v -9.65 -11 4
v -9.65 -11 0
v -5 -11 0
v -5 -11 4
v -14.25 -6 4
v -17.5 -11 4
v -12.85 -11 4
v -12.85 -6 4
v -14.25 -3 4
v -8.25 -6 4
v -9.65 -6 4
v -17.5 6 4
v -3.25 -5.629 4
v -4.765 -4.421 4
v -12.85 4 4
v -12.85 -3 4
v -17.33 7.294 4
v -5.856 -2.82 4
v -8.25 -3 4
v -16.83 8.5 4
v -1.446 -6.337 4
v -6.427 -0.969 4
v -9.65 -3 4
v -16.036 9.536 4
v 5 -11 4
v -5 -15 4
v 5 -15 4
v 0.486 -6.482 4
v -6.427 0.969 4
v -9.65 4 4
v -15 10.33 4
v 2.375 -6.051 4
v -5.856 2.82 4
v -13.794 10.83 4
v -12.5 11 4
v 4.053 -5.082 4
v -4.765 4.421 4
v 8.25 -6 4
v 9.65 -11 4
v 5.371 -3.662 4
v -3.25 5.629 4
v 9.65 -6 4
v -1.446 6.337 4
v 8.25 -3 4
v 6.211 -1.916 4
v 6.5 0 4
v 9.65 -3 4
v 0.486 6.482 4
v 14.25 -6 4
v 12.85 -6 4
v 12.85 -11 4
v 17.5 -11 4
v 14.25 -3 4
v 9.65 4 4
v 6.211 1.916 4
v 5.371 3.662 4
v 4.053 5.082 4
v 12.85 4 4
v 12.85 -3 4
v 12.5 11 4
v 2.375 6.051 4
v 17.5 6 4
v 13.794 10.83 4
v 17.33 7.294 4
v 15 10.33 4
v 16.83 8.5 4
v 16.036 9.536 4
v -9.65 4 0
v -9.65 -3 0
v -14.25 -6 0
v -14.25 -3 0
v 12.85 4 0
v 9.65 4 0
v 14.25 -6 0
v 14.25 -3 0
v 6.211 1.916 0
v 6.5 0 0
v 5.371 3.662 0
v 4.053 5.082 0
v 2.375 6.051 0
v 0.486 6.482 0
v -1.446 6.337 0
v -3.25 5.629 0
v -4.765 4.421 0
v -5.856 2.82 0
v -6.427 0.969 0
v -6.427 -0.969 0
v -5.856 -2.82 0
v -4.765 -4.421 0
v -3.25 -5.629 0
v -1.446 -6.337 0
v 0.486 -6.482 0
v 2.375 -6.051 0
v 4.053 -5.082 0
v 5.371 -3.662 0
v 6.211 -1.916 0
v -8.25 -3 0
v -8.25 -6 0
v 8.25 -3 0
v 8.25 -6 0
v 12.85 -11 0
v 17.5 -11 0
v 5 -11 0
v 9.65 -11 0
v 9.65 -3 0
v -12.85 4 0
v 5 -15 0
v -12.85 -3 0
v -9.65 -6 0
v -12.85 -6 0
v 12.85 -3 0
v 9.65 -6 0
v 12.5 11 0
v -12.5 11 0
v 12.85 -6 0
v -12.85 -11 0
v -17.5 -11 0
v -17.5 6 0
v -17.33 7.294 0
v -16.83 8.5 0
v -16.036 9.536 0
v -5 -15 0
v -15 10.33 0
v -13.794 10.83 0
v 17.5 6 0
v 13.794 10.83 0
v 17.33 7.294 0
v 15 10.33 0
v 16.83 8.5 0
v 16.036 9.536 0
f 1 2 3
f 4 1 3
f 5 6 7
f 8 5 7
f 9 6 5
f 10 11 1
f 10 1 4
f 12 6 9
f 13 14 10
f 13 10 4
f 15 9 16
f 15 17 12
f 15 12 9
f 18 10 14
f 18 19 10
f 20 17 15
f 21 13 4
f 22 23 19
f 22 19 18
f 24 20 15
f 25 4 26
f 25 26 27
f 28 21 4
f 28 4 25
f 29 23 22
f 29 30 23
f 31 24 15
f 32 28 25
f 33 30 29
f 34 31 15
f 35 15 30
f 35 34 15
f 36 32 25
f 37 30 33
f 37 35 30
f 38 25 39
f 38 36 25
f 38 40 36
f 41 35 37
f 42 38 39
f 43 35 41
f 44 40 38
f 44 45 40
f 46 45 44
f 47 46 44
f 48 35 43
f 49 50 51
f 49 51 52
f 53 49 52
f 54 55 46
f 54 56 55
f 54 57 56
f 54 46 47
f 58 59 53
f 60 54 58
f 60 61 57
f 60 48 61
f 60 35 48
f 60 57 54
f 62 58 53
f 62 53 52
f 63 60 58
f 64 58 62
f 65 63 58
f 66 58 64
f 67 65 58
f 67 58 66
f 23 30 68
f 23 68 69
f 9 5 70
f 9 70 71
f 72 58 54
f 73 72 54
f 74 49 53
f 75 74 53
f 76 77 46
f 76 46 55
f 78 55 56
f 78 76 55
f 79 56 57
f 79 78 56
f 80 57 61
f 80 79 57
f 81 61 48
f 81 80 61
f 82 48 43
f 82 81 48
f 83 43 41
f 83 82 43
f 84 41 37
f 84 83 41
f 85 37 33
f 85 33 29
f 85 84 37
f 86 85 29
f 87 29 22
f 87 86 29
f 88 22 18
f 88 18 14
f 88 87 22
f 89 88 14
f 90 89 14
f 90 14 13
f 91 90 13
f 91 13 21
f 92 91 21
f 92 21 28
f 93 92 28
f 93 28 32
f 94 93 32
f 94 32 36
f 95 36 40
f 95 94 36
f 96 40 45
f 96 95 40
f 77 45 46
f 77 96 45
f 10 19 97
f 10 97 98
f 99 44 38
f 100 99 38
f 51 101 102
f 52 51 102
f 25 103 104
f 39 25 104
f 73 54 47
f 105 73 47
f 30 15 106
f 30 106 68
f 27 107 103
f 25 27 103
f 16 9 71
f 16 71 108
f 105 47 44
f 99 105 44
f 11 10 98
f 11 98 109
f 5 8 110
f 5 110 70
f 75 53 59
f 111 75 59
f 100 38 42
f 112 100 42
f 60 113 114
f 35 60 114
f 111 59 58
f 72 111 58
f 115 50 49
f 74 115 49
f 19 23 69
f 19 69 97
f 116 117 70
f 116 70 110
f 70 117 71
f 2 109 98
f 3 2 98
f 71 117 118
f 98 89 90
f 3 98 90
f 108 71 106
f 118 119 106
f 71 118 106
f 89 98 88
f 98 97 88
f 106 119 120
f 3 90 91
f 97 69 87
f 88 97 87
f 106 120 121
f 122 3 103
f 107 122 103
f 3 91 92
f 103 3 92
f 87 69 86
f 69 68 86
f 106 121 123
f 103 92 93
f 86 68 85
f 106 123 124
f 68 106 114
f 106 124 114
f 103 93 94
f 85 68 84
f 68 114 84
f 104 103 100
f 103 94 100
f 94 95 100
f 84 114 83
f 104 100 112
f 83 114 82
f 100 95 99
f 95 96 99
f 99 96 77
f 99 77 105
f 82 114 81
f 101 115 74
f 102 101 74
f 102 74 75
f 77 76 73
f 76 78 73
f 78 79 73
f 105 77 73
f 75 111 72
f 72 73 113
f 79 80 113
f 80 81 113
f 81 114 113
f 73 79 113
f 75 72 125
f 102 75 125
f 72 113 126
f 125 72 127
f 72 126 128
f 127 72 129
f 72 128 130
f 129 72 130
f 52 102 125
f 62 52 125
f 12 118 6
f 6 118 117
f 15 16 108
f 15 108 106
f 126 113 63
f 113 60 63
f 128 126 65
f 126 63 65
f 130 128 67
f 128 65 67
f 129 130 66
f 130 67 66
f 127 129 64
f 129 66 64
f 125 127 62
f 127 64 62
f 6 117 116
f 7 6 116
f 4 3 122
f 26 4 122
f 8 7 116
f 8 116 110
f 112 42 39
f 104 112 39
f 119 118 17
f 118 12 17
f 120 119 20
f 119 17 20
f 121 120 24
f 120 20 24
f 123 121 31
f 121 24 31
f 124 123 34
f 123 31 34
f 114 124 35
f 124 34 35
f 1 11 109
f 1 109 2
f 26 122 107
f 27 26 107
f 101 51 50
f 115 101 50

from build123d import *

# Parameters (mm, degrees)
SKETCH2_R           = 6.5
BOSS_EXTRUDE1_DEPTH = 4
CUT_EXTRUDE1_DEPTH  = 24.393375131
FILLET1_R           = 5


with BuildPart() as part:
    # Sketch2 → Boss-Extrude1 (new body)
    with BuildSketch(Plane.XY):
        Polygon((5, -11), (17.5, -11), (17.5, 11), (-17.5, 11), (-17.5, -11), (-5, -11), (-5, -15), (5, -15), align=None)
        Circle(SKETCH2_R, mode=Mode.SUBTRACT)
    extrude(amount=BOSS_EXTRUDE1_DEPTH)

    # Sketch3 → Cut-Extrude1 (cut, through all)
    with BuildSketch(Plane.XY.offset(4)):
        Polygon((12.85, -11), (12.85, -6), (14.25, -6), (14.25, -3), (12.85, -3), (12.85, 4), (9.65, 4), (9.65, -3), (8.25, -3), (8.25, -6), (9.65, -6), (9.65, -11), align=None)
        Polygon((-9.65, -11), (-12.85, -11), (-12.85, -6), (-14.25, -6), (-14.25, -3), (-12.85, -3), (-12.85, 4), (-9.65, 4), (-9.65, -3), (-8.25, -3), (-8.25, -6), (-9.65, -6), align=None)
    extrude(amount=-CUT_EXTRUDE1_DEPTH, mode=Mode.SUBTRACT)

    # Fillet1
    fillet1_edges = [part.edges().sort_by_distance(p)[0] for p in [
        (-17.5, 11, 2),
        (17.5, 11, 2),
    ]]
    fillet(fillet1_edges, radius=FILLET1_R)


solid = part.part
